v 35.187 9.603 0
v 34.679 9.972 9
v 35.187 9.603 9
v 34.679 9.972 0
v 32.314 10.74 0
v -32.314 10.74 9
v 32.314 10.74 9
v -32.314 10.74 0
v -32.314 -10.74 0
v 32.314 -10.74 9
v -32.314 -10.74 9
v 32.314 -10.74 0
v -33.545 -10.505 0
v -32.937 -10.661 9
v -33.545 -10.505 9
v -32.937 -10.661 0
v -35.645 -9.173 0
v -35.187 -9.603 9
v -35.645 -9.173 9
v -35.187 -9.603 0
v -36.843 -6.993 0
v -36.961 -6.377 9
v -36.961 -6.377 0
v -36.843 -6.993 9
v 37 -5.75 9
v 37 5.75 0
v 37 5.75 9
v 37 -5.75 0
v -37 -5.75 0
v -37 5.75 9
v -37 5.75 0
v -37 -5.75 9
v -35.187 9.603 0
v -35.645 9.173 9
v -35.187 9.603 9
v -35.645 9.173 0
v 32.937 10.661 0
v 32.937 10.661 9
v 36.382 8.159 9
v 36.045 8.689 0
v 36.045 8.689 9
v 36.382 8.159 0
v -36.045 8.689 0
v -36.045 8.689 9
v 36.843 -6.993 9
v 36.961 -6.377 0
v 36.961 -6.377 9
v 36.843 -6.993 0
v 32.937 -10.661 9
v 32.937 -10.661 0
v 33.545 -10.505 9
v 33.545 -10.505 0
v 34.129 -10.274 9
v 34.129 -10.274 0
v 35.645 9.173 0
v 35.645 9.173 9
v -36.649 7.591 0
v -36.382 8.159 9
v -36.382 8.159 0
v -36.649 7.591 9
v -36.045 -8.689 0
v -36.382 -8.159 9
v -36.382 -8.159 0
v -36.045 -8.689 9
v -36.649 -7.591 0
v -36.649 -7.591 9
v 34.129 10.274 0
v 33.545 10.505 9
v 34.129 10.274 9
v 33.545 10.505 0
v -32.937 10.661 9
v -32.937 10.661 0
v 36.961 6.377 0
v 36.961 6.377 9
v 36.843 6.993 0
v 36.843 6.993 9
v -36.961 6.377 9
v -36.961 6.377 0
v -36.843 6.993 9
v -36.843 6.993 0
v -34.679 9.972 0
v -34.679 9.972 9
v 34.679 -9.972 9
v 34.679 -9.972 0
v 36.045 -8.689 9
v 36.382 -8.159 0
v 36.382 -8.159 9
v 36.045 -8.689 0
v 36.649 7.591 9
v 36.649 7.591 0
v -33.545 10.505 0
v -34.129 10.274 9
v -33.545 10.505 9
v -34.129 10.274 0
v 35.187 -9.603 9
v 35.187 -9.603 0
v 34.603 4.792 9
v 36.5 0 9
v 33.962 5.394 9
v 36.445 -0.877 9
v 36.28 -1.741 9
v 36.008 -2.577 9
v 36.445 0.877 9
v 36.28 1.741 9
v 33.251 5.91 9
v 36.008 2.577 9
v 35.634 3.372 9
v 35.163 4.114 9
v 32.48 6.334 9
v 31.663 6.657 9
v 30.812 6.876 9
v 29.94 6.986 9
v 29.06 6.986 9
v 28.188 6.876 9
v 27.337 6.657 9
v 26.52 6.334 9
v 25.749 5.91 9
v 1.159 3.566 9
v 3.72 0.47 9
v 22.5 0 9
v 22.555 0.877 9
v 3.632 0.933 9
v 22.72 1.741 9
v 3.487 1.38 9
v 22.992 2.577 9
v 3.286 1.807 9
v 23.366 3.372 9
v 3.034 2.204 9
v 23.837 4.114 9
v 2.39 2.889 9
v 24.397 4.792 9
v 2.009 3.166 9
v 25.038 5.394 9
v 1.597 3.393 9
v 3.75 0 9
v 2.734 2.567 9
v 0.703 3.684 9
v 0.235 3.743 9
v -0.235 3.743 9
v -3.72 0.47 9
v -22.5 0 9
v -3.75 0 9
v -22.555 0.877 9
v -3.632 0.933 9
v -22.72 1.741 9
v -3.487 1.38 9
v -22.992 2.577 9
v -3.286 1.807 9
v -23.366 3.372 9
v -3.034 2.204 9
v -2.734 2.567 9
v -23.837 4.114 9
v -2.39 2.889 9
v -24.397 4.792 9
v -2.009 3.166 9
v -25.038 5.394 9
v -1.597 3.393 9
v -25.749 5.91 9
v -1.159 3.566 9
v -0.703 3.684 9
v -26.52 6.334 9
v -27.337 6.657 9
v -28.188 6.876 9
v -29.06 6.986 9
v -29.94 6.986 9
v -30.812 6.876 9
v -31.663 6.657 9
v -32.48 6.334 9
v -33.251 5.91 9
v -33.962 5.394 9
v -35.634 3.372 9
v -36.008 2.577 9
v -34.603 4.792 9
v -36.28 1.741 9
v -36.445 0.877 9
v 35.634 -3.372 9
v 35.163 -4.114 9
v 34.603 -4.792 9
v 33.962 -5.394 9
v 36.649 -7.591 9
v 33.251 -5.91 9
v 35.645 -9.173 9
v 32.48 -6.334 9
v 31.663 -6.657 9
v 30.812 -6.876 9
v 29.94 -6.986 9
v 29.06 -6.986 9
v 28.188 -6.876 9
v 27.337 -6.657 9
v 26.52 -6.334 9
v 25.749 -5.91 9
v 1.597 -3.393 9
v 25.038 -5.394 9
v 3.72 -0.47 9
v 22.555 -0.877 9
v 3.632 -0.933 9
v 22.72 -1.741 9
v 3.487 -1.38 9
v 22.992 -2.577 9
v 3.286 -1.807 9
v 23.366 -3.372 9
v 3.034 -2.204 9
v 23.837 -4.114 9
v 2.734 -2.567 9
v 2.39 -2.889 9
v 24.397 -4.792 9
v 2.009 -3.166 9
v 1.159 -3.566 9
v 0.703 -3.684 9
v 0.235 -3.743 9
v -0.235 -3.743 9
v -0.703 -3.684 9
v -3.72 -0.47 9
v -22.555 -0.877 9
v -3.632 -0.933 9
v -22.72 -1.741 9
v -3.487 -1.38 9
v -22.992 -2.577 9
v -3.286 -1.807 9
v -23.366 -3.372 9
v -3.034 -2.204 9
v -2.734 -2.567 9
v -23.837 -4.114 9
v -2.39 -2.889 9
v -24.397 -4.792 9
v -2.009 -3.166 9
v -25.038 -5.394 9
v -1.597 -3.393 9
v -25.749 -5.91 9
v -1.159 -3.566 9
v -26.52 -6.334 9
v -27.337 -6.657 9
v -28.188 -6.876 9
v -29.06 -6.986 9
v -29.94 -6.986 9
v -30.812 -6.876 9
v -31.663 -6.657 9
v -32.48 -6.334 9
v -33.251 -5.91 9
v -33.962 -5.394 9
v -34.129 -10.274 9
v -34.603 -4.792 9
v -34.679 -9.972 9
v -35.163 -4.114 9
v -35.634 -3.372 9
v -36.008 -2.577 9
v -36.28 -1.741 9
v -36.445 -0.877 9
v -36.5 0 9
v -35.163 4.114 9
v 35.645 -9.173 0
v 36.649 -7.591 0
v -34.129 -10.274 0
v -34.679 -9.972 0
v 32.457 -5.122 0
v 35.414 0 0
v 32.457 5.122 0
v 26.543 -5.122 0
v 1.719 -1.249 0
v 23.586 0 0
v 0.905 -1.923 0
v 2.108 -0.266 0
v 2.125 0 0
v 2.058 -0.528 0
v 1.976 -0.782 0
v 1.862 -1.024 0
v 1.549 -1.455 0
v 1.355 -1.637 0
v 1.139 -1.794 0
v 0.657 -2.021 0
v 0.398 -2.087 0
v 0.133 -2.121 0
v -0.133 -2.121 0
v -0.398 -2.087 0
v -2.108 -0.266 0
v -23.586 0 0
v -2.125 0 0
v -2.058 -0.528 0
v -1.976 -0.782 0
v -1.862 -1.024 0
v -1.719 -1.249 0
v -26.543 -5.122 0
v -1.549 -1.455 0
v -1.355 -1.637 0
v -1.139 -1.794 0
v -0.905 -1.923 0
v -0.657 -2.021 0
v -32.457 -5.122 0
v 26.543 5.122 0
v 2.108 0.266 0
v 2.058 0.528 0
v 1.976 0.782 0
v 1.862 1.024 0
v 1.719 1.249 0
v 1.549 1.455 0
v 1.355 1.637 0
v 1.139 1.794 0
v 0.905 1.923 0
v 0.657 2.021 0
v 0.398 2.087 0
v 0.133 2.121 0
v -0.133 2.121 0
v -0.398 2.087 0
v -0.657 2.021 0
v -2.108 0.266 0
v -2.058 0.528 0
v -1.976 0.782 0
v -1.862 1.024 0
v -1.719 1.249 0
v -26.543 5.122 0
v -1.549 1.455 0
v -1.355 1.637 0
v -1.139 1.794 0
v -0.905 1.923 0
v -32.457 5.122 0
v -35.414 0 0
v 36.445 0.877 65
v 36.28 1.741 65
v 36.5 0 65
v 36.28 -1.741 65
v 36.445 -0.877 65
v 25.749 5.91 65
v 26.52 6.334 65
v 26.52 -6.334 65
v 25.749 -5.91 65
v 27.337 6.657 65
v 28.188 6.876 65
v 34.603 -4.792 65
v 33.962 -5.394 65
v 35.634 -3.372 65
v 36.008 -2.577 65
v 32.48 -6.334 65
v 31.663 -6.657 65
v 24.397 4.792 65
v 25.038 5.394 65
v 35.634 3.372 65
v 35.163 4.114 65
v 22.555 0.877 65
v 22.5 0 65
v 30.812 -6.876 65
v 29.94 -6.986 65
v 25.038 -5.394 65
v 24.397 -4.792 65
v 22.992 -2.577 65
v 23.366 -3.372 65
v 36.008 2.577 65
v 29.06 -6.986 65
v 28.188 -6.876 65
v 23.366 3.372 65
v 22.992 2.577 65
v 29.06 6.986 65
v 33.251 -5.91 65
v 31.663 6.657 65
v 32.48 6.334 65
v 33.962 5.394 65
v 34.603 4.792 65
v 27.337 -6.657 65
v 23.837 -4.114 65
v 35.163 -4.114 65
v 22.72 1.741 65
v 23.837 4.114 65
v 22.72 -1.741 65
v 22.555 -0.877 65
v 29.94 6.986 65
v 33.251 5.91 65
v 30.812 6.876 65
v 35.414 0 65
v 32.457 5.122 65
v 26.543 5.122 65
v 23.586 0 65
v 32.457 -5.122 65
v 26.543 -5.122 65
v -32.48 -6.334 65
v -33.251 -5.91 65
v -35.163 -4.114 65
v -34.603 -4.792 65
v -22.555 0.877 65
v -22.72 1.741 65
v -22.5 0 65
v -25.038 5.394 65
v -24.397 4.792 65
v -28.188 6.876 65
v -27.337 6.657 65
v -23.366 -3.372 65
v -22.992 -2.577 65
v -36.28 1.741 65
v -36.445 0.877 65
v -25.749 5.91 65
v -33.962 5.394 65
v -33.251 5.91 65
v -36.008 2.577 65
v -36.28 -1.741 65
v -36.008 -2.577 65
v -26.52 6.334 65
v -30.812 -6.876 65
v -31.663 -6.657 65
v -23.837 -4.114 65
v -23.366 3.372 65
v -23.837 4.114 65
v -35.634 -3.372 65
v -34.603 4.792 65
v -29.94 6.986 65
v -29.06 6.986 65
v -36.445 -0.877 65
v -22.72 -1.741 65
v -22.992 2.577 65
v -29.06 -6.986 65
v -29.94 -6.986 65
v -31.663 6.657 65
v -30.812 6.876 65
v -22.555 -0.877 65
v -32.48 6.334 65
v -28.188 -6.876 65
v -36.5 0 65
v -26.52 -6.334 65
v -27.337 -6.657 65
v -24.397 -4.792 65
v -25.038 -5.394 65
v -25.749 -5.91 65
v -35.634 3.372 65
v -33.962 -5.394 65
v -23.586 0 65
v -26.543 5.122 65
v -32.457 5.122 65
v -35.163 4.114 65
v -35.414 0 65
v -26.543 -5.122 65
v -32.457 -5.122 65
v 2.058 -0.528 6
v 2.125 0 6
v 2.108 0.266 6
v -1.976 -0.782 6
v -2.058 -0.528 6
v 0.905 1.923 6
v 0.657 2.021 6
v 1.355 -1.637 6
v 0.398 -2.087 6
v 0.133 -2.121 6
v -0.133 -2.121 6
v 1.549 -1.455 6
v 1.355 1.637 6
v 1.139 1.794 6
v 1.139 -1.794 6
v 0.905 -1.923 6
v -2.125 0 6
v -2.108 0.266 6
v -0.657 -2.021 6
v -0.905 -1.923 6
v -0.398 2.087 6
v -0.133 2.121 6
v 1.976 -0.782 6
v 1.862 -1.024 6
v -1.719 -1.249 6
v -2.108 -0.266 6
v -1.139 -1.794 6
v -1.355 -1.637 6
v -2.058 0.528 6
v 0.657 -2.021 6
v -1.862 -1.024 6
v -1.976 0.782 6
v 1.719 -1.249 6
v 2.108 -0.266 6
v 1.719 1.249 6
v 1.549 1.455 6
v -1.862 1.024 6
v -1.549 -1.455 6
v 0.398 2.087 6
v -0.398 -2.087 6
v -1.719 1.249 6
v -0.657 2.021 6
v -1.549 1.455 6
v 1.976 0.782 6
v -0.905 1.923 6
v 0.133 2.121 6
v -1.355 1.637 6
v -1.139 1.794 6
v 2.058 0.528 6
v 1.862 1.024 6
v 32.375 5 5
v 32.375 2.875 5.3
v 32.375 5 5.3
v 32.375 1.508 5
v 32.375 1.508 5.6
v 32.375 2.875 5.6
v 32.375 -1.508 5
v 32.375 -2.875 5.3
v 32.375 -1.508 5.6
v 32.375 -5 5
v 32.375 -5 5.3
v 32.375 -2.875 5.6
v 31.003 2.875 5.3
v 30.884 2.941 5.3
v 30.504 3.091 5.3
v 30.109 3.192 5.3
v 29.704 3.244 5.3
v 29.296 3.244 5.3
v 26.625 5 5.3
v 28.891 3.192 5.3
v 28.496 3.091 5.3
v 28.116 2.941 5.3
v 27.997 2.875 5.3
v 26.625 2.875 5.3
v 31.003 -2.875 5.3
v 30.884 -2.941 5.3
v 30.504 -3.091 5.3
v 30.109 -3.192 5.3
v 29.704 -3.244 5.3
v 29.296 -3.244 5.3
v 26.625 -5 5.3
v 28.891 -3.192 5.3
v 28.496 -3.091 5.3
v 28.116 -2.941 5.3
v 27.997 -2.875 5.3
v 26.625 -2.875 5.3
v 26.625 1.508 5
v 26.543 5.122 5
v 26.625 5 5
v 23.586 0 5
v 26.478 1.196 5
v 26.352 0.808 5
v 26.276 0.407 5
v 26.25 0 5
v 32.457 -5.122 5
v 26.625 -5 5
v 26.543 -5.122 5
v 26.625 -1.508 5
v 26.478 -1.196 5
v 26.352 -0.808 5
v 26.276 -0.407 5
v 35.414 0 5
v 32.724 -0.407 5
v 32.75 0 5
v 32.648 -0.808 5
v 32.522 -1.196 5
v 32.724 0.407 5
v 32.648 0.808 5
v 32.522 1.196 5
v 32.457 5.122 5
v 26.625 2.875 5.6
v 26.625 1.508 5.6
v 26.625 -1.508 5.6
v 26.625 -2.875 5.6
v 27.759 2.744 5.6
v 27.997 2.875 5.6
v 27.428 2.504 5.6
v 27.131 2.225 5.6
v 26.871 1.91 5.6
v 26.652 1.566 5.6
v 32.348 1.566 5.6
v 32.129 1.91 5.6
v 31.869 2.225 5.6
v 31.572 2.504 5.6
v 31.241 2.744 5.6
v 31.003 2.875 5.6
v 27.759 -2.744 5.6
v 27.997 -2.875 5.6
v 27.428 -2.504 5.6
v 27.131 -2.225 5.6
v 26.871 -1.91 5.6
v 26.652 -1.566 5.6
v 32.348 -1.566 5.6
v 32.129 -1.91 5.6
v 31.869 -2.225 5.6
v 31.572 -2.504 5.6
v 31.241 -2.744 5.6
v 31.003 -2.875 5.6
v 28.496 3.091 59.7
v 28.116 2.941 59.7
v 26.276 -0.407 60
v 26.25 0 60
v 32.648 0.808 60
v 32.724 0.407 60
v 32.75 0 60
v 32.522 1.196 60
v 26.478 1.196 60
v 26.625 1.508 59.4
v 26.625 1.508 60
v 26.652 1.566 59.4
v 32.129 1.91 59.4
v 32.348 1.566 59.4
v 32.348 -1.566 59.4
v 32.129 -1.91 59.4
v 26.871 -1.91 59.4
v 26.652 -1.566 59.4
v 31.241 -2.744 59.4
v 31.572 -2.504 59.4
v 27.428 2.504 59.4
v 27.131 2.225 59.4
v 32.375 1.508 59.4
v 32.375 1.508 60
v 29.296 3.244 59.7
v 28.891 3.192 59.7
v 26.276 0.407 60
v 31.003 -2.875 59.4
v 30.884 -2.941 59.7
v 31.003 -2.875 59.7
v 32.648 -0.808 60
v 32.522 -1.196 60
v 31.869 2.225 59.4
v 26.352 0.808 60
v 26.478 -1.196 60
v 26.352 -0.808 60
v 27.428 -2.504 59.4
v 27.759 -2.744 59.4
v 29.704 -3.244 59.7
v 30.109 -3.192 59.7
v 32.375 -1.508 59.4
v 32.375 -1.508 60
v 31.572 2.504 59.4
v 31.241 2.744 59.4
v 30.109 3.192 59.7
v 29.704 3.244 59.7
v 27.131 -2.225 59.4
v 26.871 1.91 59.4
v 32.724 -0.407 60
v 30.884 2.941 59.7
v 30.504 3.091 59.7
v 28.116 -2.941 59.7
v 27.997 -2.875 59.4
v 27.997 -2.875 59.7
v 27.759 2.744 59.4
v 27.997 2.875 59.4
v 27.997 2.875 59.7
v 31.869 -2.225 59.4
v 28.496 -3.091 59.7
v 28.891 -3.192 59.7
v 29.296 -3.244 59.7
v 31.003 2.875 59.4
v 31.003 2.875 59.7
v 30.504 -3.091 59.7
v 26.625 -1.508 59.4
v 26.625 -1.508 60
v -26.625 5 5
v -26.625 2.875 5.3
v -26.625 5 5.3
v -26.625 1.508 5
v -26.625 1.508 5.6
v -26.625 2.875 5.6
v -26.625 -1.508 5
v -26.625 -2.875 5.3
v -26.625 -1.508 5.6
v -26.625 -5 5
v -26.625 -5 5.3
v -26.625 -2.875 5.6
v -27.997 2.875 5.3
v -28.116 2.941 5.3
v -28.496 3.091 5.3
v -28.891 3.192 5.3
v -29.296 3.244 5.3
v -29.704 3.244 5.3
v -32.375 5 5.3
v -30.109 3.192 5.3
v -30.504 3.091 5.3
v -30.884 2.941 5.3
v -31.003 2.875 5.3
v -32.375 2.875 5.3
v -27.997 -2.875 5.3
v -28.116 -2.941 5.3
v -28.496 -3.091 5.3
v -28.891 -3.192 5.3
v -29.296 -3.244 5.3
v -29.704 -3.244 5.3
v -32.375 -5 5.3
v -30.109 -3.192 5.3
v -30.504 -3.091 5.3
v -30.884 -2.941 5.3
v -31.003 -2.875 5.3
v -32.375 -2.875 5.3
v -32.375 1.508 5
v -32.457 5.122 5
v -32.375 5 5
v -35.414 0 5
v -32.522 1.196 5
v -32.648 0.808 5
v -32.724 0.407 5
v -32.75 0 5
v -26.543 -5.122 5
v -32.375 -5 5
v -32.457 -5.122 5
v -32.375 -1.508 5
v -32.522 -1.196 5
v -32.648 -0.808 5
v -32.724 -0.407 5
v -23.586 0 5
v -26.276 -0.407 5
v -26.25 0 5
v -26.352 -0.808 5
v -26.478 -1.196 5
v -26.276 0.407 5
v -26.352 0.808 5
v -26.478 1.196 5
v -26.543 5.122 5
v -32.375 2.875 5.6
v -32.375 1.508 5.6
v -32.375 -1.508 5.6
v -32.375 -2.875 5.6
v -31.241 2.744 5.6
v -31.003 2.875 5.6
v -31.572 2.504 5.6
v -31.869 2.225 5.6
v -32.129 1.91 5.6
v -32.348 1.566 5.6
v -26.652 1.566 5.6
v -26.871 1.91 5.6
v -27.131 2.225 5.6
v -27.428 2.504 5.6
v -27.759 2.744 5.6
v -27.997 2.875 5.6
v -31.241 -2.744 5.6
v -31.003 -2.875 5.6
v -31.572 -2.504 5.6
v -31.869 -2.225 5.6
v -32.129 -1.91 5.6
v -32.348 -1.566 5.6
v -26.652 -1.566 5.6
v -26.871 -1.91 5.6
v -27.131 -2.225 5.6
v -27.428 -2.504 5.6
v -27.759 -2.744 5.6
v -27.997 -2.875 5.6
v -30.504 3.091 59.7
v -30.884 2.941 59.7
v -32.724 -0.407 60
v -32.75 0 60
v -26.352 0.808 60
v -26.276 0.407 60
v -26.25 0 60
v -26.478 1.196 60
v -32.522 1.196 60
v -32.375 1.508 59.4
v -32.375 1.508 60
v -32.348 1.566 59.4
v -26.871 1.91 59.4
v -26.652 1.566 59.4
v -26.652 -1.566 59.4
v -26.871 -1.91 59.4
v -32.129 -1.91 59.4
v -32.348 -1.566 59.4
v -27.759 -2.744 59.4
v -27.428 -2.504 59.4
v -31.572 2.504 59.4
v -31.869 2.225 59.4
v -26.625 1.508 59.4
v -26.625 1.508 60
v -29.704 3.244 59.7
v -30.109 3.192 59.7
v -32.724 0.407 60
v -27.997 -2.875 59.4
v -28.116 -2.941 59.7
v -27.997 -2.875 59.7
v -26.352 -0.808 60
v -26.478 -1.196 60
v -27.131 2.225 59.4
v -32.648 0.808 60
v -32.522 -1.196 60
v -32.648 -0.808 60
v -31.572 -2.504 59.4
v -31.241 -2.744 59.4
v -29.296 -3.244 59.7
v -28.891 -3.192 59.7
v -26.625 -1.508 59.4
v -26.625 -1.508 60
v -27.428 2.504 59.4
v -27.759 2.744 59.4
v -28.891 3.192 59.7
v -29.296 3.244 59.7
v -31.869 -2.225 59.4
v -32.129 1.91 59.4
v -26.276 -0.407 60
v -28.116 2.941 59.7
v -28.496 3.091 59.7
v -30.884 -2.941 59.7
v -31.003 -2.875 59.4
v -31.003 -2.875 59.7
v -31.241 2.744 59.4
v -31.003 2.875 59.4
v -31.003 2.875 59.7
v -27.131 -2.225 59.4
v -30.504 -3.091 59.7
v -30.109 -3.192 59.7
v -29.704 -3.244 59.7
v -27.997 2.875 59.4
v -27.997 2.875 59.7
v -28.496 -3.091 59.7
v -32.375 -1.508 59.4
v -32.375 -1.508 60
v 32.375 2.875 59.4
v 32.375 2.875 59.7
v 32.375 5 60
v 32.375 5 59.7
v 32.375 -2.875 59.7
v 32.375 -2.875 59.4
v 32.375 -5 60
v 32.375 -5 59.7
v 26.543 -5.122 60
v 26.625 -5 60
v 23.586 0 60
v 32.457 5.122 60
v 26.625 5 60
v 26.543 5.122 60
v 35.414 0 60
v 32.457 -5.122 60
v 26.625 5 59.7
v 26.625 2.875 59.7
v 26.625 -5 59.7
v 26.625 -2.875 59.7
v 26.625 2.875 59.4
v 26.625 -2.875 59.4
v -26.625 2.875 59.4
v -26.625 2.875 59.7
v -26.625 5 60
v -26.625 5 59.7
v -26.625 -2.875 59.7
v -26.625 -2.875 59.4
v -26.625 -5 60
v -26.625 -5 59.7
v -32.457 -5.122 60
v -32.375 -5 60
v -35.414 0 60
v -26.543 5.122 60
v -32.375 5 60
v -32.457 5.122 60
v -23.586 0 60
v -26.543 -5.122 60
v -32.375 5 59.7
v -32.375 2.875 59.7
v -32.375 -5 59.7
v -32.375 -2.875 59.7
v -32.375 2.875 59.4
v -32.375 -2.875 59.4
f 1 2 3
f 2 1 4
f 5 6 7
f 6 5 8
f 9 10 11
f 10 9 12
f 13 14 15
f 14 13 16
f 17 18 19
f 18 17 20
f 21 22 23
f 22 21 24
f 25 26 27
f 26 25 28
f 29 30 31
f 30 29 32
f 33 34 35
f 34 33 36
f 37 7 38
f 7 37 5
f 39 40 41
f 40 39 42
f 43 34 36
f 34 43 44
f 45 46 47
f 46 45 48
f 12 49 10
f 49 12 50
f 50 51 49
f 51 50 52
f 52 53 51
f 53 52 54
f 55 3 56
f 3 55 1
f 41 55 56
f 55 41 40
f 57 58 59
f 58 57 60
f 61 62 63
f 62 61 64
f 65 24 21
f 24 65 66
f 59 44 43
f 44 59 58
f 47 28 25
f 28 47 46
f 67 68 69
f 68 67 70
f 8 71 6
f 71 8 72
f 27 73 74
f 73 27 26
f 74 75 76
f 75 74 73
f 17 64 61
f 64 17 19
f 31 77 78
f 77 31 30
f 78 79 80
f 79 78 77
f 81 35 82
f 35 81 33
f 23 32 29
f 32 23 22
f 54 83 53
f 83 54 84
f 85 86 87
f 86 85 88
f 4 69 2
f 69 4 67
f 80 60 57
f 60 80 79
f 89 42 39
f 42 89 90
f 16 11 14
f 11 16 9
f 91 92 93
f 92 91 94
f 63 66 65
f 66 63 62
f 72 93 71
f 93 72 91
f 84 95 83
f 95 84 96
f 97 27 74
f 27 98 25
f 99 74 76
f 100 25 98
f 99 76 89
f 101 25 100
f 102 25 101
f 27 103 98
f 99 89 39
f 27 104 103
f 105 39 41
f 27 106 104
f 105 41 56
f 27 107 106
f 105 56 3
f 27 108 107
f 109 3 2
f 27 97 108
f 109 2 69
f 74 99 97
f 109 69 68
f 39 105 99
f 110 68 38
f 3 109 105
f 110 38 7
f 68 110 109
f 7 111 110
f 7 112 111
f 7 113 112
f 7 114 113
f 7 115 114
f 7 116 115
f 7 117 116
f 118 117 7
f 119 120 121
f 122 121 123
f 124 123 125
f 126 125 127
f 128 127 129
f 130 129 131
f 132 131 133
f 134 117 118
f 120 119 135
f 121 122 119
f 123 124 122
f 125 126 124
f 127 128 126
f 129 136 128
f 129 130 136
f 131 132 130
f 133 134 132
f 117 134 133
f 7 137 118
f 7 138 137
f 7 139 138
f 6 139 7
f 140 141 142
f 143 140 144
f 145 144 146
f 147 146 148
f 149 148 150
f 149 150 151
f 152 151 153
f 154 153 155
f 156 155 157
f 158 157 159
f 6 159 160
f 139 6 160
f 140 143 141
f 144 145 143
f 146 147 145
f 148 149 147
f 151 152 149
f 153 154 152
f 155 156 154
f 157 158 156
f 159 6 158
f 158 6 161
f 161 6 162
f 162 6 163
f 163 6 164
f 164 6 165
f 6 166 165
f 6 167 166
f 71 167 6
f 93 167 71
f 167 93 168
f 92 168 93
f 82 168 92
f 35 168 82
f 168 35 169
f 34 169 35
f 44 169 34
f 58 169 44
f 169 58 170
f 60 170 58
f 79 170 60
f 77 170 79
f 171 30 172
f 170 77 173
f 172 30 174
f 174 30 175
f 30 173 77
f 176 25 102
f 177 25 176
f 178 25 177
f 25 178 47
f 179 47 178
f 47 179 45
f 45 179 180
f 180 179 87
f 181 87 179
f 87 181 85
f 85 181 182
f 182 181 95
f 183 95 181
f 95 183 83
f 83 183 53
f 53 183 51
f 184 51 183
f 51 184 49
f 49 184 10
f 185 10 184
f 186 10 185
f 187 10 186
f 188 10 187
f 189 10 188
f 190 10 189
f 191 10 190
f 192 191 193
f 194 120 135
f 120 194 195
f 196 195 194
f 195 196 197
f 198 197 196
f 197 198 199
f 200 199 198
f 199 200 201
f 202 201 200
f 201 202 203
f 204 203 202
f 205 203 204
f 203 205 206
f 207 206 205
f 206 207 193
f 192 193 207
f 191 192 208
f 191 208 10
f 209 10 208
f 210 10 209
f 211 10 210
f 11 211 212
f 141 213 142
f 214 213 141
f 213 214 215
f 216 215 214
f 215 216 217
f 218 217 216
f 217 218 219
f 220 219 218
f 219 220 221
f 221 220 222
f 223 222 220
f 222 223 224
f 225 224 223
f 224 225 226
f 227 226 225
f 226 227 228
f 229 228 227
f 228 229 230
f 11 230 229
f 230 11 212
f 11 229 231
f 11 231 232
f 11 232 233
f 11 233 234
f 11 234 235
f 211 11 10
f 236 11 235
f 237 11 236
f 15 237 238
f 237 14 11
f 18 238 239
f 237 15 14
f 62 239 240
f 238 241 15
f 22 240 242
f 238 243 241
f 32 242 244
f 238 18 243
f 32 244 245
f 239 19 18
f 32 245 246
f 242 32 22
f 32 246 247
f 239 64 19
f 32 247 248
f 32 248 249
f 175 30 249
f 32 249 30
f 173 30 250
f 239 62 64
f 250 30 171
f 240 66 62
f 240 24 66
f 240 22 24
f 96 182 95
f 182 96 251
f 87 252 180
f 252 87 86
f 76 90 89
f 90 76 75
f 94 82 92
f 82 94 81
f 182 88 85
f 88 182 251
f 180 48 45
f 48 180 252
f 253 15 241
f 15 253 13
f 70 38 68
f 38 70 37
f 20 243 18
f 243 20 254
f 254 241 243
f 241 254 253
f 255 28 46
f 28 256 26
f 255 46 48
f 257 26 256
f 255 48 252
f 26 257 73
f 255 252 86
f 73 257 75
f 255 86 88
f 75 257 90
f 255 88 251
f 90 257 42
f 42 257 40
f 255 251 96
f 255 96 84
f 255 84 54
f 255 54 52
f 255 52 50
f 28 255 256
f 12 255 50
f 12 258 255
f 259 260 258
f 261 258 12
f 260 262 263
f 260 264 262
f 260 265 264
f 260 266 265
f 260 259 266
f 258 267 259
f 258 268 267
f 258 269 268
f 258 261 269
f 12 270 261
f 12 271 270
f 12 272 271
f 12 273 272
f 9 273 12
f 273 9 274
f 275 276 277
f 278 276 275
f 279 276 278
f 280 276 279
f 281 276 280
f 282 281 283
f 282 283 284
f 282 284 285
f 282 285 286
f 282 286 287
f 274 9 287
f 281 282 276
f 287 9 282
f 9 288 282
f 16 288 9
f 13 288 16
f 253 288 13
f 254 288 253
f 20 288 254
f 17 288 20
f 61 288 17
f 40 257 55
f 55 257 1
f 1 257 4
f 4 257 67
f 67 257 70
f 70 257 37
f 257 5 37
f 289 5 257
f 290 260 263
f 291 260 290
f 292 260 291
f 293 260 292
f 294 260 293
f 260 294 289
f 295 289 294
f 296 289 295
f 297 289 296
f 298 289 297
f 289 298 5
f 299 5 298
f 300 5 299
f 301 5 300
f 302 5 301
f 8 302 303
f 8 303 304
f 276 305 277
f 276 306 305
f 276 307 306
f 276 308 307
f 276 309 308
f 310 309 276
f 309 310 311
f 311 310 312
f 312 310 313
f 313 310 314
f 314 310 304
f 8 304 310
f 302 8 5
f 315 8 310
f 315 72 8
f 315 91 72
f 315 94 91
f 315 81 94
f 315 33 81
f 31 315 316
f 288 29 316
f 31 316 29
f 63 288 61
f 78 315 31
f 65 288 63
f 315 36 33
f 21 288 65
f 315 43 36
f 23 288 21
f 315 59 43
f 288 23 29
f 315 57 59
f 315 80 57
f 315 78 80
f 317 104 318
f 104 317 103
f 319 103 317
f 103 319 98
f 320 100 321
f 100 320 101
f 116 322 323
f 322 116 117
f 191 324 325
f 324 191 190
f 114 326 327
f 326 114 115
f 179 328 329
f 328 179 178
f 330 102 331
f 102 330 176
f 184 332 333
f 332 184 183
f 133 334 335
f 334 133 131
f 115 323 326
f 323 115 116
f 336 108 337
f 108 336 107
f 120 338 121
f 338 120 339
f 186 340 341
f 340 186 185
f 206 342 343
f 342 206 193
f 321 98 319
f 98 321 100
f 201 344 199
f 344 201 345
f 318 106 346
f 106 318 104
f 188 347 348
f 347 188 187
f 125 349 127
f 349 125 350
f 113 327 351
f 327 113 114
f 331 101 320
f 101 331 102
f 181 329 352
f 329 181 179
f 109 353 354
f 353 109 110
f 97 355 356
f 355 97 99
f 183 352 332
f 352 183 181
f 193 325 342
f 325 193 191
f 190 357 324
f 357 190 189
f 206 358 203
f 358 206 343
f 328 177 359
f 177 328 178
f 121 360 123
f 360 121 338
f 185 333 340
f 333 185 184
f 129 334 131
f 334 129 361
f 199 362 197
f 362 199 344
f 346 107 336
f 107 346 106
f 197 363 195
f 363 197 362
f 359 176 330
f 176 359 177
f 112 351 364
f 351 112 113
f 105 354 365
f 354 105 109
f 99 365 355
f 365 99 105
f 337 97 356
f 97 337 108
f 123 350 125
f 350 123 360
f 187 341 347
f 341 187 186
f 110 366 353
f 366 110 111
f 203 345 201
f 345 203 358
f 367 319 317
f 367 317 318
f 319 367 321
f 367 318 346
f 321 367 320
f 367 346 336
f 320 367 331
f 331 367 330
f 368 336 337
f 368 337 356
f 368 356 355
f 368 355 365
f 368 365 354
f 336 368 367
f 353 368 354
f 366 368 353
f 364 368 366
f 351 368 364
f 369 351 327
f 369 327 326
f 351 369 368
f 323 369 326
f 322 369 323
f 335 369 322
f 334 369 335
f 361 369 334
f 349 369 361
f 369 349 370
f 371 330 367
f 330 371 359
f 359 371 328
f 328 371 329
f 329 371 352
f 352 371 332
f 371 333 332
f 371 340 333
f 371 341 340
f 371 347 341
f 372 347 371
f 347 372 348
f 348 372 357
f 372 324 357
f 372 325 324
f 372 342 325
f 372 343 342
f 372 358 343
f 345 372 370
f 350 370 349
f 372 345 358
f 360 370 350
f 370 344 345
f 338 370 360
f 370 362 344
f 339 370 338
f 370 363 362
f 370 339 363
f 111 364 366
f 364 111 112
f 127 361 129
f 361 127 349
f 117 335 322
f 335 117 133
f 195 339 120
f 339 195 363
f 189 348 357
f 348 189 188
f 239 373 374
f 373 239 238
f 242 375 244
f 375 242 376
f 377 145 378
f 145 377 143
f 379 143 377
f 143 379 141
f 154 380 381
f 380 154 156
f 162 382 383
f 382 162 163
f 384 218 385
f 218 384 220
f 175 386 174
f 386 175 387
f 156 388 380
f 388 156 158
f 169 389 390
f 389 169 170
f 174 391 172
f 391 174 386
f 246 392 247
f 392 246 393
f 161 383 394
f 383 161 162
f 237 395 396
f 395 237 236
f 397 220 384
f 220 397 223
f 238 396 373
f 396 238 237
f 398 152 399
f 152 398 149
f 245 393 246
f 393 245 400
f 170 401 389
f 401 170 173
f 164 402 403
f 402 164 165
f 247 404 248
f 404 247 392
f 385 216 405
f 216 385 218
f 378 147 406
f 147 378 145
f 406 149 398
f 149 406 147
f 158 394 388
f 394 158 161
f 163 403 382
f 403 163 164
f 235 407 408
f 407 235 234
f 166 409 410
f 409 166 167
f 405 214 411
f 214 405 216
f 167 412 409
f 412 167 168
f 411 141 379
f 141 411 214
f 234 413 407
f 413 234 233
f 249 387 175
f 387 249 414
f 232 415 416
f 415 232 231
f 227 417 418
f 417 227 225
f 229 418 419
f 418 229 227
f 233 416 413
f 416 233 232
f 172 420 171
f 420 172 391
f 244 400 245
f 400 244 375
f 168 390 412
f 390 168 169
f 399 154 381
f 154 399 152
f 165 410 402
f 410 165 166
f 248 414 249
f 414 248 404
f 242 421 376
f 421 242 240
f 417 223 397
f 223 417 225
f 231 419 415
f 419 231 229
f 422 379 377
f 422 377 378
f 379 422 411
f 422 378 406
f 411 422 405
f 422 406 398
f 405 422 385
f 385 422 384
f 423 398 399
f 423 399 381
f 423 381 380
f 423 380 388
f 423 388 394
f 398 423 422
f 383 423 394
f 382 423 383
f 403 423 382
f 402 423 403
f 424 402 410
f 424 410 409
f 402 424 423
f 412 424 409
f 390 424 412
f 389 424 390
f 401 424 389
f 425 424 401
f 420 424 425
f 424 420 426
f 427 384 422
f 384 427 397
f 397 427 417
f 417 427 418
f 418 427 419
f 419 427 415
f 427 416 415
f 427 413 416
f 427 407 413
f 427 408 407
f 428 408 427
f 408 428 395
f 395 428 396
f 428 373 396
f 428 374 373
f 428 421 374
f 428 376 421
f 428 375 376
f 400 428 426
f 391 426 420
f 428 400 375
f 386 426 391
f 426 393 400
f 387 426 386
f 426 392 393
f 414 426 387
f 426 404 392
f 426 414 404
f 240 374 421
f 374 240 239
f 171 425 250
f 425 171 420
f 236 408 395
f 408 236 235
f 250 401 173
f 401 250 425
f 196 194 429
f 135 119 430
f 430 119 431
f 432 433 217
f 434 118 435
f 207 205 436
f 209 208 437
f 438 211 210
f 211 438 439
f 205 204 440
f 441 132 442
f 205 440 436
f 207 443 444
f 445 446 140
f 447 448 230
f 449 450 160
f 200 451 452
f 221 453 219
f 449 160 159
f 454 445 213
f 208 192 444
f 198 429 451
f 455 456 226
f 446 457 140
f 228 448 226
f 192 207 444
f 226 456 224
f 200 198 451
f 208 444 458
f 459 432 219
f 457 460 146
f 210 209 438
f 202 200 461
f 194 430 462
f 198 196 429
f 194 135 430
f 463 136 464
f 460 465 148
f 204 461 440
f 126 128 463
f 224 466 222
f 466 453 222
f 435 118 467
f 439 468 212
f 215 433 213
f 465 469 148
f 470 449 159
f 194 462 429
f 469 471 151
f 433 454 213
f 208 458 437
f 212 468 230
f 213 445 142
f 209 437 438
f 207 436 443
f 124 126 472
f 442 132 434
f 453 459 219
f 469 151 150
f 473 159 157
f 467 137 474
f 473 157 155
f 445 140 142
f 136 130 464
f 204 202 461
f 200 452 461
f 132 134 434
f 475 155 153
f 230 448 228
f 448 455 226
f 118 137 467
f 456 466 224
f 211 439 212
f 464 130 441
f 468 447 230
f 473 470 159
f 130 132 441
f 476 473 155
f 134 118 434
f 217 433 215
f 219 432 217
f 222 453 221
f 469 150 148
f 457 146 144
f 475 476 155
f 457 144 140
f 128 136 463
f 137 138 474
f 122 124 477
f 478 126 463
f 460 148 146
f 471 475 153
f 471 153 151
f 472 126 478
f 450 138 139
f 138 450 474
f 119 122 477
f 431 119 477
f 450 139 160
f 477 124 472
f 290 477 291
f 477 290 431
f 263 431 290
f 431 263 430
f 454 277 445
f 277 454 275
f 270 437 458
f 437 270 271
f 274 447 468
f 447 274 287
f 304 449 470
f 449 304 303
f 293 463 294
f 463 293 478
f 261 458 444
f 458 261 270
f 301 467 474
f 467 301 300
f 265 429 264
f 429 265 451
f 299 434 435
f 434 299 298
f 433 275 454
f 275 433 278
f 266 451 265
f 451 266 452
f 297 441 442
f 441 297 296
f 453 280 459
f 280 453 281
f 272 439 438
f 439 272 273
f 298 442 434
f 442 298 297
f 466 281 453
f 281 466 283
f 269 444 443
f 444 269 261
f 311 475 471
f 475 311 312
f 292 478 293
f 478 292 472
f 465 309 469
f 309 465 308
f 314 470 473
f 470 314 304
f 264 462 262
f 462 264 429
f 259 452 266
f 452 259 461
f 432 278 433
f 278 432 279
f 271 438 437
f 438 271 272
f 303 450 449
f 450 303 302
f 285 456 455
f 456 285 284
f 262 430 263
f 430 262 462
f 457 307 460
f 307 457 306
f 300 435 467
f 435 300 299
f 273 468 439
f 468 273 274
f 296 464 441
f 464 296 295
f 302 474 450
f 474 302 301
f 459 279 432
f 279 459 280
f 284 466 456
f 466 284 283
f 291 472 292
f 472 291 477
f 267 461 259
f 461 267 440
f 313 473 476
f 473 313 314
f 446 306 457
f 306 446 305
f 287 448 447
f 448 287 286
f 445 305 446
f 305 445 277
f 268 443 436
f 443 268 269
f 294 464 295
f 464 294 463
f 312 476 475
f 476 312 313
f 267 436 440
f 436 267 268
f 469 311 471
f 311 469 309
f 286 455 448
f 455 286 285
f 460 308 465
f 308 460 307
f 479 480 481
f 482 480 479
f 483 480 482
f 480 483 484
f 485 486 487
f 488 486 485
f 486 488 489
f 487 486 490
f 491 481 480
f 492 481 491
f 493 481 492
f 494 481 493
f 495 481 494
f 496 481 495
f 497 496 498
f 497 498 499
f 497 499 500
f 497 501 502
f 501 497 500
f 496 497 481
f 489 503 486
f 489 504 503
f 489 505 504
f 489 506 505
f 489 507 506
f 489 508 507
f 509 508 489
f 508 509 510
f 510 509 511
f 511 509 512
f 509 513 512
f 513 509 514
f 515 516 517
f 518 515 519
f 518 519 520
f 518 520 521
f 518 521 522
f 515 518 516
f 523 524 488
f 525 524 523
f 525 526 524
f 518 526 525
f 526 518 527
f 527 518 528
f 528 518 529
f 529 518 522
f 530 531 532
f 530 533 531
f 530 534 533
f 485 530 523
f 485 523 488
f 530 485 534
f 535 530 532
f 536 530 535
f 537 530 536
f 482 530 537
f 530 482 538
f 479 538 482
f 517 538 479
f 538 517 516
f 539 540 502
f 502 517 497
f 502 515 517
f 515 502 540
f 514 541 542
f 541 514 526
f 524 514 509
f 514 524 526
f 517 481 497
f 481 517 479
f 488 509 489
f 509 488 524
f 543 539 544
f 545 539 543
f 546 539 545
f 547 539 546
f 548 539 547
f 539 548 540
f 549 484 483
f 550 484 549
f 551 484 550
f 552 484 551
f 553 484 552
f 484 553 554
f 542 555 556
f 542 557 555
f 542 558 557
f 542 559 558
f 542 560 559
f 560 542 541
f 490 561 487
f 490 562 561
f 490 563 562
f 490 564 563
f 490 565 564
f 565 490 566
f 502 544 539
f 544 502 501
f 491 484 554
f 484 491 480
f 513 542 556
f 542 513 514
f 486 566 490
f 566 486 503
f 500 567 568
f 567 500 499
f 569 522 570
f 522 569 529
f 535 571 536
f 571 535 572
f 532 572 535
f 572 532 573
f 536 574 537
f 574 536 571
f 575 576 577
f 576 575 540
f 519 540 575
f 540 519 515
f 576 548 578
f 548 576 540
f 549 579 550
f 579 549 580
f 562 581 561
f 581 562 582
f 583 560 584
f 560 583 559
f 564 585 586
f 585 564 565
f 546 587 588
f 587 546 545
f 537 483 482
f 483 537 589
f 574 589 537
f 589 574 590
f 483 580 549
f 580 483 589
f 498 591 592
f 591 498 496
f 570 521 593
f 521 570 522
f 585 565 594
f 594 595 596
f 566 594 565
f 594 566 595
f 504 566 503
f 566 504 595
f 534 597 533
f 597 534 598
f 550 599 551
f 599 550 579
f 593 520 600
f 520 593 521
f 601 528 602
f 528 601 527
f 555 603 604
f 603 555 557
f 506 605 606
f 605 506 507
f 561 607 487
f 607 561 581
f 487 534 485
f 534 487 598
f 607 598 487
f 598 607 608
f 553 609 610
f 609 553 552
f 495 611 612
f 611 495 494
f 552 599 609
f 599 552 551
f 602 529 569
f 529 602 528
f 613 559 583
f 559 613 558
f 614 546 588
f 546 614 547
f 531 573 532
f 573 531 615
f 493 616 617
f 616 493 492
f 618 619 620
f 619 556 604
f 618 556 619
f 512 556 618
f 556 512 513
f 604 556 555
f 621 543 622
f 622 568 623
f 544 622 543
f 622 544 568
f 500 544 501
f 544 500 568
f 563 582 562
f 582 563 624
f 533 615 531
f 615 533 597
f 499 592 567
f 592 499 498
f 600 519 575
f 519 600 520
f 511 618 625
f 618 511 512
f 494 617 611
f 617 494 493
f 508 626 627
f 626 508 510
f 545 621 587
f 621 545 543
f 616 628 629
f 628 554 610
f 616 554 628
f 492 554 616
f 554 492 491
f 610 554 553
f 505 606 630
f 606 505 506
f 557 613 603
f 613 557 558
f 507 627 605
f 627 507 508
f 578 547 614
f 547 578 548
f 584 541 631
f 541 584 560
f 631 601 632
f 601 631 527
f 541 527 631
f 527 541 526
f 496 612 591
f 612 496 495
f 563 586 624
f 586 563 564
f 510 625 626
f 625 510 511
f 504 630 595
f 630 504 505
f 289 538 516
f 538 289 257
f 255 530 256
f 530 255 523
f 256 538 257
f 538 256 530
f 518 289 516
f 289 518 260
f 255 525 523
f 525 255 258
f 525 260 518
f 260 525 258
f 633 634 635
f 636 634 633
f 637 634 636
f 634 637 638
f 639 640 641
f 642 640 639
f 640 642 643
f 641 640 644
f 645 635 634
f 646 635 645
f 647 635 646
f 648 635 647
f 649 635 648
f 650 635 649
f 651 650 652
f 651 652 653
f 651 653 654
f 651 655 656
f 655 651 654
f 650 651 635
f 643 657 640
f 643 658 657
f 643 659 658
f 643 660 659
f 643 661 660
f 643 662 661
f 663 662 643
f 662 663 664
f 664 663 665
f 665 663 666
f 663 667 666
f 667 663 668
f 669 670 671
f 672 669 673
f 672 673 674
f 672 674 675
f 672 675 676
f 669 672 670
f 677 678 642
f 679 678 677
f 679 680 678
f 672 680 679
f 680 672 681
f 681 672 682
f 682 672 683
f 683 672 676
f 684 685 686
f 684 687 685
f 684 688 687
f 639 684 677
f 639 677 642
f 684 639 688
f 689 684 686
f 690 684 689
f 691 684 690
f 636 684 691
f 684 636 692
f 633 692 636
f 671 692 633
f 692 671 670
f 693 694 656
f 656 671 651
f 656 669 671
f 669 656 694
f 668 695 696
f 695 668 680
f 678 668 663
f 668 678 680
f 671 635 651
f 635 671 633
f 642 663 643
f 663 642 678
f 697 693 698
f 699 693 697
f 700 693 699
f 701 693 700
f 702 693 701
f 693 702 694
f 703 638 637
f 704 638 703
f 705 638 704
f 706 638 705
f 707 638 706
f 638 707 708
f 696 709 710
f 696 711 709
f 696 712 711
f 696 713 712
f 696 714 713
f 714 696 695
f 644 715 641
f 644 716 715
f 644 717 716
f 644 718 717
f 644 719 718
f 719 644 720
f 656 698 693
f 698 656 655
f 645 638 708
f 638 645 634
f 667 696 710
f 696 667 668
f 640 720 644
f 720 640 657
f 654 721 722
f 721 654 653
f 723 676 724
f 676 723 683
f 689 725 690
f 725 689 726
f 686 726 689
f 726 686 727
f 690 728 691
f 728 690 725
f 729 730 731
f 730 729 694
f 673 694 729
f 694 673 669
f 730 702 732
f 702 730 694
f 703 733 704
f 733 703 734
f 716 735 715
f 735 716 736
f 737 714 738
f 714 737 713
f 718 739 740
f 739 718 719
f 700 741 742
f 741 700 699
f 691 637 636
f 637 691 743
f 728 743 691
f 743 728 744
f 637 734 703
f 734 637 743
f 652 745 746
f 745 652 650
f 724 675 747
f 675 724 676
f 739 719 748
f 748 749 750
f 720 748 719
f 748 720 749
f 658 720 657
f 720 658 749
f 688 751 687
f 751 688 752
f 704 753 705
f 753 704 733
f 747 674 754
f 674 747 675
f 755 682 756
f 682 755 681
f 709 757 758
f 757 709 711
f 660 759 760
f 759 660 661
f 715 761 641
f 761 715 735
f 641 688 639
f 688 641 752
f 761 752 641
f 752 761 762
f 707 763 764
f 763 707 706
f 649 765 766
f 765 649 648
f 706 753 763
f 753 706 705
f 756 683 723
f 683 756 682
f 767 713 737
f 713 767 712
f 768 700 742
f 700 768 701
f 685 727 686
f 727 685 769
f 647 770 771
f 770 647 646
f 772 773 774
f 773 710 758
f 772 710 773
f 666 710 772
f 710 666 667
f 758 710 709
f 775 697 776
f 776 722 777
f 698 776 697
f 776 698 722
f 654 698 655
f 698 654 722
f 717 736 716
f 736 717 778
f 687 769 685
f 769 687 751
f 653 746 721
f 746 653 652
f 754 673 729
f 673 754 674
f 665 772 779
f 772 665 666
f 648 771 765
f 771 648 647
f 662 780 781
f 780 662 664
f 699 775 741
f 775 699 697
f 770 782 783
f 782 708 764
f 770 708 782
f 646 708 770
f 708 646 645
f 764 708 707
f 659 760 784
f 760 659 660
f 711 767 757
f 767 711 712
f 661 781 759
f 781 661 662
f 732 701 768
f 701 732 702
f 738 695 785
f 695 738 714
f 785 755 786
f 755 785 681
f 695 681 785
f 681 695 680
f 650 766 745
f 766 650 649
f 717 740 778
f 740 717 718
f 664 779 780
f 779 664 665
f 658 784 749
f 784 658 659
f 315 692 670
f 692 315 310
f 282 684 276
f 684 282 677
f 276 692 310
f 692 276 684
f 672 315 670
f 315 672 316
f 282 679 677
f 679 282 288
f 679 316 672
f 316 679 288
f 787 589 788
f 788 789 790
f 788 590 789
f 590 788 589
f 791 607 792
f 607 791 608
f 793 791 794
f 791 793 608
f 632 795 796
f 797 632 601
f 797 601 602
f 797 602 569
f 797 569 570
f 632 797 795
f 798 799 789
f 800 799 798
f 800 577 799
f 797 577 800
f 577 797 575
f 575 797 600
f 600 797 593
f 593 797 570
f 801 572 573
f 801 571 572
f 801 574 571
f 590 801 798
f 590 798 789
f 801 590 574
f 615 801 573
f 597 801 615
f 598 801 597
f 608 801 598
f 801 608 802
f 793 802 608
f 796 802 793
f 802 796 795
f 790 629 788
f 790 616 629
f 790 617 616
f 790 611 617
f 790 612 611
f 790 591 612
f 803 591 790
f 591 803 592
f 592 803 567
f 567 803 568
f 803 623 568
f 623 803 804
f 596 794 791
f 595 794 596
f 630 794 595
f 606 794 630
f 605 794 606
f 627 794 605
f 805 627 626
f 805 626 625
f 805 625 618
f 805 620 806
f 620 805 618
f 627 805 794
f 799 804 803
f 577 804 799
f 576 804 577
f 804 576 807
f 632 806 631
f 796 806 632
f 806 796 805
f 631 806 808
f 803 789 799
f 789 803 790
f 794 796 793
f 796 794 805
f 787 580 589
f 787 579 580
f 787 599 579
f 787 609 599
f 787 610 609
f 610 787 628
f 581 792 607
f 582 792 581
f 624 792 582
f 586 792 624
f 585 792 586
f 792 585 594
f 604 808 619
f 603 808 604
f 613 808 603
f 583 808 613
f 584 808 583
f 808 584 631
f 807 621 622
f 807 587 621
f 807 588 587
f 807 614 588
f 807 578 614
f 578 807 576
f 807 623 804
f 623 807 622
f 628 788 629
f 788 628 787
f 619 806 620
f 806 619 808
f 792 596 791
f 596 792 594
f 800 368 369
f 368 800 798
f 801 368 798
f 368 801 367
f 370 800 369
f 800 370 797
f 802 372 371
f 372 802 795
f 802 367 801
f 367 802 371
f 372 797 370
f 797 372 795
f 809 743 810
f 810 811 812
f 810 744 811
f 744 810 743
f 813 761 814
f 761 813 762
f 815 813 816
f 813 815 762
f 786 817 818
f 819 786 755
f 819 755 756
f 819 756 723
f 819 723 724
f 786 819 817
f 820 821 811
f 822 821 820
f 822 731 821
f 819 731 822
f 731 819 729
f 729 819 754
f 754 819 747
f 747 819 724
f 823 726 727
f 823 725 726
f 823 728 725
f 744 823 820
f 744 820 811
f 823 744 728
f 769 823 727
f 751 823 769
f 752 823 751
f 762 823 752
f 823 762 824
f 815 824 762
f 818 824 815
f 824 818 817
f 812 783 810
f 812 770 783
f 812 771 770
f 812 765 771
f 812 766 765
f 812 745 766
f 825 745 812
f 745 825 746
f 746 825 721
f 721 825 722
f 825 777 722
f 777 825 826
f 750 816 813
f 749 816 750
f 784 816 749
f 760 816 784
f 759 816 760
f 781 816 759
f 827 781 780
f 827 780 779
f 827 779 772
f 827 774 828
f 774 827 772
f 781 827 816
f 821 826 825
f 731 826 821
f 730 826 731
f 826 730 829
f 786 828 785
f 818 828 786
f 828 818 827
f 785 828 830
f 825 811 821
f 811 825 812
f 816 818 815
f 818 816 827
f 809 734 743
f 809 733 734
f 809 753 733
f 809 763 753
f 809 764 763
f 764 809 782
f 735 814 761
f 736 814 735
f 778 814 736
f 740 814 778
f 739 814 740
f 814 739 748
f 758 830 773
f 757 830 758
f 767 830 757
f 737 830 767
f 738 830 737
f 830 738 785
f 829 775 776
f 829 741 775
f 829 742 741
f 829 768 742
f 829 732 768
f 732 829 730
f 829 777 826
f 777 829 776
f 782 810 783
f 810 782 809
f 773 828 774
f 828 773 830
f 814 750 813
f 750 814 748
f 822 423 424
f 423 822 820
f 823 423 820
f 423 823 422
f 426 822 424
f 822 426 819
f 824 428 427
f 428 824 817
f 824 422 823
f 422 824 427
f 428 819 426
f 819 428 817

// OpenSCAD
$fn = 50;


difference() {
	union() {
		hull() {
			translate(v = [-32.0000000000, 5.7500000000, 0]) {
				cylinder(h = 9, r = 5);
			}
			translate(v = [32.0000000000, 5.7500000000, 0]) {
				cylinder(h = 9, r = 5);
			}
			translate(v = [-32.0000000000, -5.7500000000, 0]) {
				cylinder(h = 9, r = 5);
			}
			translate(v = [32.0000000000, -5.7500000000, 0]) {
				cylinder(h = 9, r = 5);
			}
		}
		translate(v = [29.5000000000, 0, 0.0000000000]) {
			cylinder(h = 65, r = 7.0000000000);
		}
		translate(v = [-29.5000000000, 0, 0.0000000000]) {
			cylinder(h = 65, r = 7.0000000000);
		}
		translate(v = [29.5000000000, 0, 59.0000000000]) {
			cylinder(h = 6, r = 7.0000000000);
		}
		translate(v = [-29.5000000000, 0, 59.0000000000]) {
			cylinder(h = 6, r = 7.0000000000);
		}
	}
	union() {
		translate(v = [0, 0, 9]) {
			rotate(a = [0, 0, 0]) {
				difference() {
					union() {
						#translate(v = [0, 0, -60.0000000000]) {
							cylinder(h = 60, r = 2.0000000000);
						}
						#translate(v = [0, 0, -3]) {
							cylinder(h = 3, r1 = 2.1250000000, r2 = 3.7500000000);
						}
						#translate(v = [0, 0, -60.0000000000]) {
							cylinder(h = 60, r = 2.1250000000);
						}
						#translate(v = [0, 0, -60.0000000000]) {
							cylinder(h = 60, r = 2.0000000000);
						}
					}
					union();
				}
			}
		}
		translate(v = [29.5000000000, 0, 0]) {
			rotate(a = [0, 0, 0]) {
				difference() {
					union() {
						#translate(v = [-2.8750000000, -5.0000000000, -0.3000000000]) {
							cube(size = [5.7500000000, 10, 0.3000000000]);
						}
						#translate(v = [-2.8750000000, -2.8750000000, -0.6000000000]) {
							cube(size = [5.7500000000, 5.7500000000, 0.3000000000]);
						}
						#translate(v = [-2.8750000000, -5.0000000000, 5]) {
							cube(size = [5.7500000000, 10, 0.3000000000]);
						}
						#translate(v = [-2.8750000000, -2.8750000000, 5.3000000000]) {
							cube(size = [5.7500000000, 5.7500000000, 0.3000000000]);
						}
						#translate(v = [0, 0, -100.0000000000]) {
							cylinder(h = 200, r = 3.2500000000);
						}
						#linear_extrude(height = 5) {
							polygon(points = [[5.9142500000, 0.0000000000], [2.9571250000, 5.1218907443], [-2.9571250000, 5.1218907443], [-5.9142500000, 0.0000000000], [-2.9571250000, -5.1218907443], [2.9571250000, -5.1218907443]]);
						}
						#translate(v = [-2.8750000000, -5.0000000000, -0.3000000000]) {
							cube(size = [5.7500000000, 10, 0.3000000000]);
						}
						#translate(v = [-2.8750000000, -2.8750000000, -0.6000000000]) {
							cube(size = [5.7500000000, 5.7500000000, 0.3000000000]);
						}
						#translate(v = [-2.8750000000, -5.0000000000, 5]) {
							cube(size = [5.7500000000, 10, 0.3000000000]);
						}
						#translate(v = [-2.8750000000, -2.8750000000, 5.3000000000]) {
							cube(size = [5.7500000000, 5.7500000000, 0.3000000000]);
						}
						#translate(v = [0, 0, -100.0000000000]) {
							cylinder(h = 200, r = 3.2500000000);
						}
						#translate(v = [-2.8750000000, -5.0000000000, -0.3000000000]) {
							cube(size = [5.7500000000, 10, 0.3000000000]);
						}
						#translate(v = [-2.8750000000, -2.8750000000, -0.6000000000]) {
							cube(size = [5.7500000000, 5.7500000000, 0.3000000000]);
						}
						#translate(v = [-2.8750000000, -5.0000000000, 5]) {
							cube(size = [5.7500000000, 10, 0.3000000000]);
						}
						#translate(v = [-2.8750000000, -2.8750000000, 5.3000000000]) {
							cube(size = [5.7500000000, 5.7500000000, 0.3000000000]);
						}
						#translate(v = [0, 0, -100.0000000000]) {
							cylinder(h = 200, r = 3.2500000000);
						}
					}
					union();
				}
			}
		}
		translate(v = [-29.5000000000, 0, 0]) {
			rotate(a = [0, 0, 0]) {
				difference() {
					union() {
						#translate(v = [-2.8750000000, -5.0000000000, -0.3000000000]) {
							cube(size = [5.7500000000, 10, 0.3000000000]);
						}
						#translate(v = [-2.8750000000, -2.8750000000, -0.6000000000]) {
							cube(size = [5.7500000000, 5.7500000000, 0.3000000000]);
						}
						#translate(v = [-2.8750000000, -5.0000000000, 5]) {
							cube(size = [5.7500000000, 10, 0.3000000000]);
						}
						#translate(v = [-2.8750000000, -2.8750000000, 5.3000000000]) {
							cube(size = [5.7500000000, 5.7500000000, 0.3000000000]);
						}
						#translate(v = [0, 0, -100.0000000000]) {
							cylinder(h = 200, r = 3.2500000000);
						}
						#linear_extrude(height = 5) {
							polygon(points = [[5.9142500000, 0.0000000000], [2.9571250000, 5.1218907443], [-2.9571250000, 5.1218907443], [-5.9142500000, 0.0000000000], [-2.9571250000, -5.1218907443], [2.9571250000, -5.1218907443]]);
						}
						#translate(v = [-2.8750000000, -5.0000000000, -0.3000000000]) {
							cube(size = [5.7500000000, 10, 0.3000000000]);
						}
						#translate(v = [-2.8750000000, -2.8750000000, -0.6000000000]) {
							cube(size = [5.7500000000, 5.7500000000, 0.3000000000]);
						}
						#translate(v = [-2.8750000000, -5.0000000000, 5]) {
							cube(size = [5.7500000000, 10, 0.3000000000]);
						}
						#translate(v = [-2.8750000000, -2.8750000000, 5.3000000000]) {
							cube(size = [5.7500000000, 5.7500000000, 0.3000000000]);
						}
						#translate(v = [0, 0, -100.0000000000]) {
							cylinder(h = 200, r = 3.2500000000);
						}
						#translate(v = [-2.8750000000, -5.0000000000, -0.3000000000]) {
							cube(size = [5.7500000000, 10, 0.3000000000]);
						}
						#translate(v = [-2.8750000000, -2.8750000000, -0.6000000000]) {
							cube(size = [5.7500000000, 5.7500000000, 0.3000000000]);
						}
						#translate(v = [-2.8750000000, -5.0000000000, 5]) {
							cube(size = [5.7500000000, 10, 0.3000000000]);
						}
						#translate(v = [-2.8750000000, -2.8750000000, 5.3000000000]) {
							cube(size = [5.7500000000, 5.7500000000, 0.3000000000]);
						}
						#translate(v = [0, 0, -100.0000000000]) {
							cylinder(h = 200, r = 3.2500000000);
						}
					}
					union();
				}
			}
		}
		translate(v = [29.5000000000, 0, 65]) {
			rotate(a = [0, 0, 0]) {
				difference() {
					union() {
						#translate(v = [-2.8750000000, -5.0000000000, -5.3000000000]) {
							cube(size = [5.7500000000, 10, 0.3000000000]);
						}
						#translate(v = [-2.8750000000, -2.8750000000, -5.6000000000]) {
							cube(size = [5.7500000000, 5.7500000000, 0.3000000000]);
						}
						#translate(v = [-2.8750000000, -5.0000000000, 0]) {
							cube(size = [5.7500000000, 10, 0.3000000000]);
						}
						#translate(v = [-2.8750000000, -2.8750000000, 0.3000000000]) {
							cube(size = [5.7500000000, 5.7500000000, 0.3000000000]);
						}
						#translate(v = [0, 0, -100.0000000000]) {
							cylinder(h = 200, r = 3.2500000000);
						}
						translate(v = [0, 0, -5]) {
							#linear_extrude(height = 5) {
								polygon(points = [[5.9142500000, 0.0000000000], [2.9571250000, 5.1218907443], [-2.9571250000, 5.1218907443], [-5.9142500000, 0.0000000000], [-2.9571250000, -5.1218907443], [2.9571250000, -5.1218907443]]);
							}
						}
						#translate(v = [-2.8750000000, -5.0000000000, -5.3000000000]) {
							cube(size = [5.7500000000, 10, 0.3000000000]);
						}
						#translate(v = [-2.8750000000, -2.8750000000, -5.6000000000]) {
							cube(size = [5.7500000000, 5.7500000000, 0.3000000000]);
						}
						#translate(v = [-2.8750000000, -5.0000000000, 0]) {
							cube(size = [5.7500000000, 10, 0.3000000000]);
						}
						#translate(v = [-2.8750000000, -2.8750000000, 0.3000000000]) {
							cube(size = [5.7500000000, 5.7500000000, 0.3000000000]);
						}
						#translate(v = [0, 0, -100.0000000000]) {
							cylinder(h = 200, r = 3.2500000000);
						}
						#translate(v = [-2.8750000000, -5.0000000000, -5.3000000000]) {
							cube(size = [5.7500000000, 10, 0.3000000000]);
						}
						#translate(v = [-2.8750000000, -2.8750000000, -5.6000000000]) {
							cube(size = [5.7500000000, 5.7500000000, 0.3000000000]);
						}
						#translate(v = [-2.8750000000, -5.0000000000, 0]) {
							cube(size = [5.7500000000, 10, 0.3000000000]);
						}
						#translate(v = [-2.8750000000, -2.8750000000, 0.3000000000]) {
							cube(size = [5.7500000000, 5.7500000000, 0.3000000000]);
						}
						#translate(v = [0, 0, -100.0000000000]) {
							cylinder(h = 200, r = 3.2500000000);
						}
					}
					union();
				}
			}
		}
		translate(v = [-29.5000000000, 0, 65]) {
			rotate(a = [0, 0, 0]) {
				difference() {
					union() {
						#translate(v = [-2.8750000000, -5.0000000000, -5.3000000000]) {
							cube(size = [5.7500000000, 10, 0.3000000000]);
						}
						#translate(v = [-2.8750000000, -2.8750000000, -5.6000000000]) {
							cube(size = [5.7500000000, 5.7500000000, 0.3000000000]);
						}
						#translate(v = [-2.8750000000, -5.0000000000, 0]) {
							cube(size = [5.7500000000, 10, 0.3000000000]);
						}
						#translate(v = [-2.8750000000, -2.8750000000, 0.3000000000]) {
							cube(size = [5.7500000000, 5.7500000000, 0.3000000000]);
						}
						#translate(v = [0, 0, -100.0000000000]) {
							cylinder(h = 200, r = 3.2500000000);
						}
						translate(v = [0, 0, -5]) {
							#linear_extrude(height = 5) {
								polygon(points = [[5.9142500000, 0.0000000000], [2.9571250000, 5.1218907443], [-2.9571250000, 5.1218907443], [-5.9142500000, 0.0000000000], [-2.9571250000, -5.1218907443], [2.9571250000, -5.1218907443]]);
							}
						}
						#translate(v = [-2.8750000000, -5.0000000000, -5.3000000000]) {
							cube(size = [5.7500000000, 10, 0.3000000000]);
						}
						#translate(v = [-2.8750000000, -2.8750000000, -5.6000000000]) {
							cube(size = [5.7500000000, 5.7500000000, 0.3000000000]);
						}
						#translate(v = [-2.8750000000, -5.0000000000, 0]) {
							cube(size = [5.7500000000, 10, 0.3000000000]);
						}
						#translate(v = [-2.8750000000, -2.8750000000, 0.3000000000]) {
							cube(size = [5.7500000000, 5.7500000000, 0.3000000000]);
						}
						#translate(v = [0, 0, -100.0000000000]) {
							cylinder(h = 200, r = 3.2500000000);
						}
						#translate(v = [-2.8750000000, -5.0000000000, -5.3000000000]) {
							cube(size = [5.7500000000, 10, 0.3000000000]);
						}
						#translate(v = [-2.8750000000, -2.8750000000, -5.6000000000]) {
							cube(size = [5.7500000000, 5.7500000000, 0.3000000000]);
						}
						#translate(v = [-2.8750000000, -5.0000000000, 0]) {
							cube(size = [5.7500000000, 10, 0.3000000000]);
						}
						#translate(v = [-2.8750000000, -2.8750000000, 0.3000000000]) {
							cube(size = [5.7500000000, 5.7500000000, 0.3000000000]);
						}
						#translate(v = [0, 0, -100.0000000000]) {
							cylinder(h = 200, r = 3.2500000000);
						}
					}
					union();
				}
			}
		}
	}
}
